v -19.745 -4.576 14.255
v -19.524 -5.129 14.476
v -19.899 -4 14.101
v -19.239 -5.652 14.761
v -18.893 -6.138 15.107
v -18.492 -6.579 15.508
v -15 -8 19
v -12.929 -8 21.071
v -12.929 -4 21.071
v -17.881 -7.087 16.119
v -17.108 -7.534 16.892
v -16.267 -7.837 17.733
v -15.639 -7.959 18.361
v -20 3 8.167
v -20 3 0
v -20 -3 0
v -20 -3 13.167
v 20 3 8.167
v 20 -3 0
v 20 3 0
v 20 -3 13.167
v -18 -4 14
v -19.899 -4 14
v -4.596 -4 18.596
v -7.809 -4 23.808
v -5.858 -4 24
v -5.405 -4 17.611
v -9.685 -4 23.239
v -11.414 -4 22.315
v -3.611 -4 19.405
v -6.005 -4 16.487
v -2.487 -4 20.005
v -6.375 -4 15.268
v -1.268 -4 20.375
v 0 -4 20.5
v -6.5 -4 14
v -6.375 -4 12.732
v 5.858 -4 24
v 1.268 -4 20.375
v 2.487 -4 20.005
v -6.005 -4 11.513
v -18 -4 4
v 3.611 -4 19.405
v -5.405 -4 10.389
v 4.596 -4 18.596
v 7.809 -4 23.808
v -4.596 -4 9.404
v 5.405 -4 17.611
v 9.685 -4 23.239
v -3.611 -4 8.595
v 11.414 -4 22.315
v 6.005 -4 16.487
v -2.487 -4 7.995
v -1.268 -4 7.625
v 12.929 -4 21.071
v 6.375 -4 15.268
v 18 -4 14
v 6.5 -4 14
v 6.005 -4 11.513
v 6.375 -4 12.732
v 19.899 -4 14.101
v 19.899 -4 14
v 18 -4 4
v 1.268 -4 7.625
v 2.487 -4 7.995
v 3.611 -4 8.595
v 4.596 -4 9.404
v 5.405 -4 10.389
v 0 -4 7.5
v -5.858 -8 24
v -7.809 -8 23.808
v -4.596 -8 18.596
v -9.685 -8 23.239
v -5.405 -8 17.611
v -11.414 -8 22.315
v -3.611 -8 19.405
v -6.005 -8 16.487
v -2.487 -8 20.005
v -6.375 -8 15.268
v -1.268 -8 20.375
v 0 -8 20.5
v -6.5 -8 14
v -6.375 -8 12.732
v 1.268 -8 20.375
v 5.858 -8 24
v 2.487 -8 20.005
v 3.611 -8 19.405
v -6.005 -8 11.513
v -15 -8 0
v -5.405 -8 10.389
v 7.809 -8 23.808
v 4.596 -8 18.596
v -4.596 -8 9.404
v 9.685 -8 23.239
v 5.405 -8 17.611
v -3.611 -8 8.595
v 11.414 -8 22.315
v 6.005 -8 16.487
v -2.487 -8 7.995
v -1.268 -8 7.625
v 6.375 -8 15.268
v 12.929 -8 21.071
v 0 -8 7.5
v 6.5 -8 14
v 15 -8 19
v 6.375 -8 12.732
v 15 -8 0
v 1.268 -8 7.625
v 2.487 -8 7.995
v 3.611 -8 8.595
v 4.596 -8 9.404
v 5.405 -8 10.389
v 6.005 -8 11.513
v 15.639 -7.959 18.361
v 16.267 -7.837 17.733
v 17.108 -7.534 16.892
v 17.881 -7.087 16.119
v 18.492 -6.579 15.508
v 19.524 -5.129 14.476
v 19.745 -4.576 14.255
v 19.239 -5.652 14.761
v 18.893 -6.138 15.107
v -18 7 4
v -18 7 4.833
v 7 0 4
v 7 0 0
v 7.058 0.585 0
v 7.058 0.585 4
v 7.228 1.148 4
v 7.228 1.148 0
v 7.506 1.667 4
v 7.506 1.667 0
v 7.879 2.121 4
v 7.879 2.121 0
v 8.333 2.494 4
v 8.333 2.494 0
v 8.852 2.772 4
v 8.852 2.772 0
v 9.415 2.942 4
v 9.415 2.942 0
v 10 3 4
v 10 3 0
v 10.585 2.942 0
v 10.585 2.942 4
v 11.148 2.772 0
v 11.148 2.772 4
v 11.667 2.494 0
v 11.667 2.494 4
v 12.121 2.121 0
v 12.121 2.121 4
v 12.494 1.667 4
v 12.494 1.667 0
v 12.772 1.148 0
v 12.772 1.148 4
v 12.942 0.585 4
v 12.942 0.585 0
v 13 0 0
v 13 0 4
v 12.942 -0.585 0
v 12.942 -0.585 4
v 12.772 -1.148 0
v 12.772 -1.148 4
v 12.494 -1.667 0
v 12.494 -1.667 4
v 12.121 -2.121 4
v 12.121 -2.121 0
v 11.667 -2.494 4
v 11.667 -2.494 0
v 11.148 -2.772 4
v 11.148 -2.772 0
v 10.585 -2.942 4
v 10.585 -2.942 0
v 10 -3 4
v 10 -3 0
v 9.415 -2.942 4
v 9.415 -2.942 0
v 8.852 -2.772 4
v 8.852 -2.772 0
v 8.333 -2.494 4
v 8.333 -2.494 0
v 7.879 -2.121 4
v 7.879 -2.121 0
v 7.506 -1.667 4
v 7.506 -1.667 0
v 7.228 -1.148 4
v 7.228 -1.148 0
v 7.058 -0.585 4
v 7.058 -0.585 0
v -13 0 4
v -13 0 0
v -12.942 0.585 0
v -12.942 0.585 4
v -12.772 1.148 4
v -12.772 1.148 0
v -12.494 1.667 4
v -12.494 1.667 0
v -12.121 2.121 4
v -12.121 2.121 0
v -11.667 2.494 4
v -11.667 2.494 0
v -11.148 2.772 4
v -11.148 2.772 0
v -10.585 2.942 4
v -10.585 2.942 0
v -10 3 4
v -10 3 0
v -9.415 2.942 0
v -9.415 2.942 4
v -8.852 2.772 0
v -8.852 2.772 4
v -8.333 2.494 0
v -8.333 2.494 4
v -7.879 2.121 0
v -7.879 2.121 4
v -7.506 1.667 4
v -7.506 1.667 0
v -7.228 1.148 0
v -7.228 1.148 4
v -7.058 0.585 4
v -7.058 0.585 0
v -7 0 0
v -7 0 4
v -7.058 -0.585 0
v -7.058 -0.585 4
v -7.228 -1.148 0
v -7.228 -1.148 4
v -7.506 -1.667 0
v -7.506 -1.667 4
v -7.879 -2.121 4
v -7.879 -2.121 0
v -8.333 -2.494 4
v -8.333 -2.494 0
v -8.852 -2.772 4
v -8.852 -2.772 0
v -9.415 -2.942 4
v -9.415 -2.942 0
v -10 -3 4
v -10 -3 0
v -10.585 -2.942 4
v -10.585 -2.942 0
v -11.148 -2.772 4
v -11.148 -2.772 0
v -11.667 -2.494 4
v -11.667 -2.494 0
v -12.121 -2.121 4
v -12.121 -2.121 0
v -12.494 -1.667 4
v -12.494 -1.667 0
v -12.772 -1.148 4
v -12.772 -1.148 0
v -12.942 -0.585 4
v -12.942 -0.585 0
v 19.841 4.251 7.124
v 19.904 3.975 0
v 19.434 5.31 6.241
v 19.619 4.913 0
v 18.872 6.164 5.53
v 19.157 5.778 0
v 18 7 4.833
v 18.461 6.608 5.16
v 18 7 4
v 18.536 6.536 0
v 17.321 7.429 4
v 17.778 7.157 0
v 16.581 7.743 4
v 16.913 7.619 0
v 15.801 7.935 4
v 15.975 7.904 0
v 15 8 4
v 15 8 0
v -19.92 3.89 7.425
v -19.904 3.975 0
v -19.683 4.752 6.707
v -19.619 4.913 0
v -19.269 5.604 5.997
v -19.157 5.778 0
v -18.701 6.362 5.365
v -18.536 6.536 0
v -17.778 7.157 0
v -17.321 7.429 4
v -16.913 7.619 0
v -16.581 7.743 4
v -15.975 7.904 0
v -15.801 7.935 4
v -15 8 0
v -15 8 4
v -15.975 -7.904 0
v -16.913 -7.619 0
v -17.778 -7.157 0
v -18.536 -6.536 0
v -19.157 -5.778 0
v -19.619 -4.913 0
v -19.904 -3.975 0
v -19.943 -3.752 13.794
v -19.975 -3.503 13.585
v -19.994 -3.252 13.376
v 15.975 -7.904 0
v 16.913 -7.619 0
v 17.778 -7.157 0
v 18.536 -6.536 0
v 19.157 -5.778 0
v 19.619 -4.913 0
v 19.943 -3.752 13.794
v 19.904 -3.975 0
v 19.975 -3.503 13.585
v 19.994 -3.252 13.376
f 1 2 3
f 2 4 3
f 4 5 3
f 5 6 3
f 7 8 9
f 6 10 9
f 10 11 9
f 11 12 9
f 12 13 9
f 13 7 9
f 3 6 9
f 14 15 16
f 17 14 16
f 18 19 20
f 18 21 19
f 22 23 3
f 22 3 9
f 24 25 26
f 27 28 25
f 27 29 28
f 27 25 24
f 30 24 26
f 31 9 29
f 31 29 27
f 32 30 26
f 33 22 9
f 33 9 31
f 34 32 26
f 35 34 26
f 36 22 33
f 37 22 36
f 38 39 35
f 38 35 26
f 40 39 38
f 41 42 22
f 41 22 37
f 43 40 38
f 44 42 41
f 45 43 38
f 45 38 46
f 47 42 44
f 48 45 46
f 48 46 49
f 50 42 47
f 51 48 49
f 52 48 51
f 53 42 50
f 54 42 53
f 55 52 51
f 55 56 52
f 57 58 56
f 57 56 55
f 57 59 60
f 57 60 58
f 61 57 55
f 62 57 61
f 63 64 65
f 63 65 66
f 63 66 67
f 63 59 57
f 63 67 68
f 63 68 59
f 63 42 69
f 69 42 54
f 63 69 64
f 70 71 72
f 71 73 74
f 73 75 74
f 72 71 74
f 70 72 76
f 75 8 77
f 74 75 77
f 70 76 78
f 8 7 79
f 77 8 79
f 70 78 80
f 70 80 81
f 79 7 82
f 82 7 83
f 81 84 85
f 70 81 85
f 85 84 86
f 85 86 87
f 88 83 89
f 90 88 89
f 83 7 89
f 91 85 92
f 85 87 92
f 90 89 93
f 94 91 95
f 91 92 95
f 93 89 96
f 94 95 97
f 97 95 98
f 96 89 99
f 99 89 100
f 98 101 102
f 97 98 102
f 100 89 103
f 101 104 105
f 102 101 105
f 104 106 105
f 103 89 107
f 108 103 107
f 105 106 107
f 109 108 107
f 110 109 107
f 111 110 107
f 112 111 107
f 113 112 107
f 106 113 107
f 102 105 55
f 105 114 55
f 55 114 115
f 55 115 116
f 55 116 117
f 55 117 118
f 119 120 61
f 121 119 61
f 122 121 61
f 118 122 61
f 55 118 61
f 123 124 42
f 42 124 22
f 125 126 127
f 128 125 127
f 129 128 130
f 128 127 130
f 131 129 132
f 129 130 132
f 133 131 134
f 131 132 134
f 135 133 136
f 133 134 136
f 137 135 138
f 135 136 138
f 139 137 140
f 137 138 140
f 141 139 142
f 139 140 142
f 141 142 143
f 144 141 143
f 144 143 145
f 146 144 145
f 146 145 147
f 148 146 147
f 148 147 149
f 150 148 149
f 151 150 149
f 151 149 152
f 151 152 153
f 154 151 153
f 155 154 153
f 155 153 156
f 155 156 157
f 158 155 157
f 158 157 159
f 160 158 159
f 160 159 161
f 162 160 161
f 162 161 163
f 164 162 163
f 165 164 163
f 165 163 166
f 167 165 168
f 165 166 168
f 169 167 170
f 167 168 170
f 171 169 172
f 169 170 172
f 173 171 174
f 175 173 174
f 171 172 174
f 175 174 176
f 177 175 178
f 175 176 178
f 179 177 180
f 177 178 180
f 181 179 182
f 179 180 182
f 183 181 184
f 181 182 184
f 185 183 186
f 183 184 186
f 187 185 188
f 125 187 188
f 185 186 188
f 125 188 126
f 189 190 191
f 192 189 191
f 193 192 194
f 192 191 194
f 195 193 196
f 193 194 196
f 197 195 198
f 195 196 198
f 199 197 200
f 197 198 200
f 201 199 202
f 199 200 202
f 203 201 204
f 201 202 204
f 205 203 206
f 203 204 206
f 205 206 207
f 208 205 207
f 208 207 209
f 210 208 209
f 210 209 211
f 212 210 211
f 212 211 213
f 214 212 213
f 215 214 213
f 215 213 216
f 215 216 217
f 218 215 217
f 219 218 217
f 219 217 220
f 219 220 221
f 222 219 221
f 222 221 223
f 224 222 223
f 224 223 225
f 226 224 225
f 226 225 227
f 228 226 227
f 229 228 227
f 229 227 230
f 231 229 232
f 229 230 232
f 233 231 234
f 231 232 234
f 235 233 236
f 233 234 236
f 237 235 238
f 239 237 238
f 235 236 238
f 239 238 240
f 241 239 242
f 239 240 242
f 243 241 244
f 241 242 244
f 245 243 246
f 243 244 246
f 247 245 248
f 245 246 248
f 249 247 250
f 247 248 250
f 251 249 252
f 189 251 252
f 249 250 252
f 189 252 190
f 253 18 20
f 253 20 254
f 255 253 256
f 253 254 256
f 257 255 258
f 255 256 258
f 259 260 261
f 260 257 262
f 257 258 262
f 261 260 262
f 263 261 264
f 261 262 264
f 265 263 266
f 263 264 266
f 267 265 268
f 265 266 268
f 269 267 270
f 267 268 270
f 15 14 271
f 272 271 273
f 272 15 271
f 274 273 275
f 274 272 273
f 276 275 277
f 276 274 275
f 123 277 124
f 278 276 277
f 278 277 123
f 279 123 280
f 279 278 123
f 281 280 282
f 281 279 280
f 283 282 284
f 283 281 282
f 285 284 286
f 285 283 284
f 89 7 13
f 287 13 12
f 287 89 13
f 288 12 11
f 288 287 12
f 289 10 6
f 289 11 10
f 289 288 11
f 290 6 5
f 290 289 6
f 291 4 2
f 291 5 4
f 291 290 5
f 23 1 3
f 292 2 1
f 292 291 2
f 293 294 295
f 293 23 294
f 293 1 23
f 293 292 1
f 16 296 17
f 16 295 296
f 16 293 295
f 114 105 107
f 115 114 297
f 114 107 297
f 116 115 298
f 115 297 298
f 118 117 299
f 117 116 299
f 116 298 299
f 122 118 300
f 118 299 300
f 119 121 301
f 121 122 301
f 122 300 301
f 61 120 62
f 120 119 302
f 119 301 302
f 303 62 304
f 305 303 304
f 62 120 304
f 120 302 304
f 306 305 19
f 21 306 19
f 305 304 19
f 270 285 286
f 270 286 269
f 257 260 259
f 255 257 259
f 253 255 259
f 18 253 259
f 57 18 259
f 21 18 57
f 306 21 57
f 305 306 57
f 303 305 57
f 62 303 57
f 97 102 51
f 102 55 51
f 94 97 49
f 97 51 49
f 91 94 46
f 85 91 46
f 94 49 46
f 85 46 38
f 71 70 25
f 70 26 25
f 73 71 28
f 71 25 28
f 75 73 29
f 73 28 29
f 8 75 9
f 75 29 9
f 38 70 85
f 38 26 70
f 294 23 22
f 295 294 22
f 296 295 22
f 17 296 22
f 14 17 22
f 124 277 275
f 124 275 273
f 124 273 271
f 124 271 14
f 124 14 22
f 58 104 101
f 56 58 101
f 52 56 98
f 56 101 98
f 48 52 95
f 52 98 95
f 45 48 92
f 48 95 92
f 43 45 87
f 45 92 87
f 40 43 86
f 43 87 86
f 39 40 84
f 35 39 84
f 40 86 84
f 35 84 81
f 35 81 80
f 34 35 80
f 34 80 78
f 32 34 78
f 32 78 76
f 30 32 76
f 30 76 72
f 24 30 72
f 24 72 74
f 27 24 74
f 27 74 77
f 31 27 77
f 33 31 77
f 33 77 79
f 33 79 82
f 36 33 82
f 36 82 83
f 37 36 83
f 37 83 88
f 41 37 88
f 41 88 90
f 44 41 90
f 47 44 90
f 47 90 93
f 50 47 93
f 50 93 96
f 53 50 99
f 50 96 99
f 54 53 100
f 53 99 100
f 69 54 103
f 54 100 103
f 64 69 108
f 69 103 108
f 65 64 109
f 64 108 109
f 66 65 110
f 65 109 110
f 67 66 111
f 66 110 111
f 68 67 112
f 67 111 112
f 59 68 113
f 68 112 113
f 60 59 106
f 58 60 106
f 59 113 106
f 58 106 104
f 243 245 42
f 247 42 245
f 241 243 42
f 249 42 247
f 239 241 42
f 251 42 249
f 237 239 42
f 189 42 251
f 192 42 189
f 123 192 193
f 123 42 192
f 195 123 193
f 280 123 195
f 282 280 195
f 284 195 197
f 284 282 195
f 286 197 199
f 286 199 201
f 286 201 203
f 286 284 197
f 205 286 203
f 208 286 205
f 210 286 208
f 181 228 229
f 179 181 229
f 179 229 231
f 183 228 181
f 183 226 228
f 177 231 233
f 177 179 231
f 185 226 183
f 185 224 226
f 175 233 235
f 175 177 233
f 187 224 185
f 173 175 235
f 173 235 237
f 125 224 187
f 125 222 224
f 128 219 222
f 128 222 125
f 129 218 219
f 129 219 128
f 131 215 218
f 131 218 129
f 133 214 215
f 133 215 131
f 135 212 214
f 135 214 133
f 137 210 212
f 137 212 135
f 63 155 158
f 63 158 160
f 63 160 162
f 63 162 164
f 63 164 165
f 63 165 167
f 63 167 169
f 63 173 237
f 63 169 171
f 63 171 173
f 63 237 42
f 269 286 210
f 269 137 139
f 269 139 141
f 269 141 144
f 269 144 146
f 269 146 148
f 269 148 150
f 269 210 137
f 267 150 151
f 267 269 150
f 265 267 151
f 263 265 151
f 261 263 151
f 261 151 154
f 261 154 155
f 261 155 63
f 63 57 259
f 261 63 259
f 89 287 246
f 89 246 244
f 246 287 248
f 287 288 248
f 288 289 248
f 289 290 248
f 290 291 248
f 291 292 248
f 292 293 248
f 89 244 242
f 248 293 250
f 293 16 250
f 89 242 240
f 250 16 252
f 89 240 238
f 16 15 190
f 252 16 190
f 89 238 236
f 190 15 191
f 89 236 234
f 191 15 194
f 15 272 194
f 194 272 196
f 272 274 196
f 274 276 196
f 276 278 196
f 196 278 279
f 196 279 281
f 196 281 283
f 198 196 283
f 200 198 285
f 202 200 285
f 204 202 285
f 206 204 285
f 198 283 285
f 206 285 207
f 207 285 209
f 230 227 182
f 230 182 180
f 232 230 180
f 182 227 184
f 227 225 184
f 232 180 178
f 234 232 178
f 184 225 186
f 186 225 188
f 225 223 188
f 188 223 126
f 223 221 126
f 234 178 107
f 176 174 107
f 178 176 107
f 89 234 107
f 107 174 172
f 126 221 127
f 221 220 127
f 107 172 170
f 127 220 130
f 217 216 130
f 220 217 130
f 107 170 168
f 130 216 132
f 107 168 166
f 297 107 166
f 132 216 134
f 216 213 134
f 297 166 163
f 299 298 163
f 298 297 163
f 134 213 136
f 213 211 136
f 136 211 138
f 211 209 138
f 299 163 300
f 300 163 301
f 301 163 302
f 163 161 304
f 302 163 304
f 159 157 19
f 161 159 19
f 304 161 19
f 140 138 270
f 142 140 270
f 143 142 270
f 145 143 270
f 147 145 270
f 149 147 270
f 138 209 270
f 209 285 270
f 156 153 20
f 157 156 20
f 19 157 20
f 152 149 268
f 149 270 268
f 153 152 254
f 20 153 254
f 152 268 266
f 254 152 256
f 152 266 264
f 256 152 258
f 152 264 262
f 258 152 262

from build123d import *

# Parameters (mm, degrees)
F0_W         = 40
F0_H         = 16
F1_DEPTH     = 4
F2_W         = 40
F2_H         = 4
F3_DEPTH     = 20
F4_D         = 6
F12_D        = 13
F6_SIZE      = 10
F8_DEPTH     = 2
F9_DEPTH     = 2
F10_T1_DEPTH = 29
F10_T3_DEPTH = 39
F11_R        = 10


# Not quite as in the source:
# - a fillet or chamfer that OpenCascade refuses, or shapes differently, is made with other operations: its cross-section is extruded or revolved along the edge and cut away or added


with BuildPart() as f1:
    # F0 (on Top) → F1 (new body)
    with BuildSketch(Plane.XY):
        Rectangle(F0_W, F0_H)
    extrude(amount=F1_DEPTH)

    # F2 (on face) → F3 (join)
    with BuildSketch(Plane.XY.offset(4)):
        with Locations((0, -6)):
            Rectangle(F2_W, F2_H)
    extrude(amount=F3_DEPTH)

    # F4 (through all)
    with Locations(Plane.XY.offset(4)):
        with Locations((-10, 0), (10, 0)):
            Hole(F4_D / 2)

    # F12 (through all)
    with Locations(Plane(origin=(0, -4, 0), x_dir=(-1, 0, 0), z_dir=(0, 1, 0))):
        with Locations((0, 14)):
            Hole(F12_D / 2)

    # F6
    f6_edges = [f1.edges().sort_by_distance(p)[0] for p in [
        (-20, -6, 24),
        (20, -6, 24),
    ]]
    chamfer(f6_edges, length=F6_SIZE)

    # F7 (on face) → F8 (join)
    with BuildSketch(Plane(origin=(-20, 0, 0), x_dir=(0, -1, 0), z_dir=(-1, 0, 0))):
        Polygon((4, 14), (-8, 4), (4, 4), align=None)
    extrude(amount=-F8_DEPTH)

    # F13 (on face) → F9 (join)
    with BuildSketch(Plane.YZ.offset(20)):
        Polygon((-4, 4), (8, 4), (-4, 14), align=None)
    extrude(amount=-F9_DEPTH)

    # F10: fillet of radius 5 on 4 edges, made by hand

    # F10_s2 → F10_t1 (cut)
    with BuildSketch(Plane.XY.offset(-12.5)):
        with BuildLine():
            ThreePointArc((20, 3), (18.5355339059, 6.5355339059), (15, 8))
            Line((15, 8), (20, 8))
            Line((20, 8), (20, 3))
        make_face()
        with BuildLine():
            ThreePointArc((-20, 3), (-18.5355339059, 6.5355339059), (-15, 8))
            Line((-15, 8), (-20, 8))
            Line((-20, 8), (-20, 3))
        make_face()
    extrude(amount=F10_T1_DEPTH, mode=Mode.SUBTRACT)

    # F10_s4 → F10_t3 (cut)
    with BuildSketch(Plane.XY.offset(-12.5)):
        with BuildLine():
            ThreePointArc((-15, -8), (-18.5355339059, -6.5355339059), (-20, -3))
            Line((-20, -3), (-20, -8))
            Line((-20, -8), (-15, -8))
        make_face()
        with BuildLine():
            ThreePointArc((15, -8), (18.5355339059, -6.5355339059), (20, -3))
            Line((20, -3), (20, -8))
            Line((20, -8), (15, -8))
        make_face()
    extrude(amount=F10_T3_DEPTH, mode=Mode.SUBTRACT)

    # F11
    f11_edges = [f1.edges().sort_by_distance(p)[0] for p in [
        (10, -6, 24),
        (-10, -6, 24),
    ]]
    fillet(f11_edges, radius=F11_R)


solid = f1.part
